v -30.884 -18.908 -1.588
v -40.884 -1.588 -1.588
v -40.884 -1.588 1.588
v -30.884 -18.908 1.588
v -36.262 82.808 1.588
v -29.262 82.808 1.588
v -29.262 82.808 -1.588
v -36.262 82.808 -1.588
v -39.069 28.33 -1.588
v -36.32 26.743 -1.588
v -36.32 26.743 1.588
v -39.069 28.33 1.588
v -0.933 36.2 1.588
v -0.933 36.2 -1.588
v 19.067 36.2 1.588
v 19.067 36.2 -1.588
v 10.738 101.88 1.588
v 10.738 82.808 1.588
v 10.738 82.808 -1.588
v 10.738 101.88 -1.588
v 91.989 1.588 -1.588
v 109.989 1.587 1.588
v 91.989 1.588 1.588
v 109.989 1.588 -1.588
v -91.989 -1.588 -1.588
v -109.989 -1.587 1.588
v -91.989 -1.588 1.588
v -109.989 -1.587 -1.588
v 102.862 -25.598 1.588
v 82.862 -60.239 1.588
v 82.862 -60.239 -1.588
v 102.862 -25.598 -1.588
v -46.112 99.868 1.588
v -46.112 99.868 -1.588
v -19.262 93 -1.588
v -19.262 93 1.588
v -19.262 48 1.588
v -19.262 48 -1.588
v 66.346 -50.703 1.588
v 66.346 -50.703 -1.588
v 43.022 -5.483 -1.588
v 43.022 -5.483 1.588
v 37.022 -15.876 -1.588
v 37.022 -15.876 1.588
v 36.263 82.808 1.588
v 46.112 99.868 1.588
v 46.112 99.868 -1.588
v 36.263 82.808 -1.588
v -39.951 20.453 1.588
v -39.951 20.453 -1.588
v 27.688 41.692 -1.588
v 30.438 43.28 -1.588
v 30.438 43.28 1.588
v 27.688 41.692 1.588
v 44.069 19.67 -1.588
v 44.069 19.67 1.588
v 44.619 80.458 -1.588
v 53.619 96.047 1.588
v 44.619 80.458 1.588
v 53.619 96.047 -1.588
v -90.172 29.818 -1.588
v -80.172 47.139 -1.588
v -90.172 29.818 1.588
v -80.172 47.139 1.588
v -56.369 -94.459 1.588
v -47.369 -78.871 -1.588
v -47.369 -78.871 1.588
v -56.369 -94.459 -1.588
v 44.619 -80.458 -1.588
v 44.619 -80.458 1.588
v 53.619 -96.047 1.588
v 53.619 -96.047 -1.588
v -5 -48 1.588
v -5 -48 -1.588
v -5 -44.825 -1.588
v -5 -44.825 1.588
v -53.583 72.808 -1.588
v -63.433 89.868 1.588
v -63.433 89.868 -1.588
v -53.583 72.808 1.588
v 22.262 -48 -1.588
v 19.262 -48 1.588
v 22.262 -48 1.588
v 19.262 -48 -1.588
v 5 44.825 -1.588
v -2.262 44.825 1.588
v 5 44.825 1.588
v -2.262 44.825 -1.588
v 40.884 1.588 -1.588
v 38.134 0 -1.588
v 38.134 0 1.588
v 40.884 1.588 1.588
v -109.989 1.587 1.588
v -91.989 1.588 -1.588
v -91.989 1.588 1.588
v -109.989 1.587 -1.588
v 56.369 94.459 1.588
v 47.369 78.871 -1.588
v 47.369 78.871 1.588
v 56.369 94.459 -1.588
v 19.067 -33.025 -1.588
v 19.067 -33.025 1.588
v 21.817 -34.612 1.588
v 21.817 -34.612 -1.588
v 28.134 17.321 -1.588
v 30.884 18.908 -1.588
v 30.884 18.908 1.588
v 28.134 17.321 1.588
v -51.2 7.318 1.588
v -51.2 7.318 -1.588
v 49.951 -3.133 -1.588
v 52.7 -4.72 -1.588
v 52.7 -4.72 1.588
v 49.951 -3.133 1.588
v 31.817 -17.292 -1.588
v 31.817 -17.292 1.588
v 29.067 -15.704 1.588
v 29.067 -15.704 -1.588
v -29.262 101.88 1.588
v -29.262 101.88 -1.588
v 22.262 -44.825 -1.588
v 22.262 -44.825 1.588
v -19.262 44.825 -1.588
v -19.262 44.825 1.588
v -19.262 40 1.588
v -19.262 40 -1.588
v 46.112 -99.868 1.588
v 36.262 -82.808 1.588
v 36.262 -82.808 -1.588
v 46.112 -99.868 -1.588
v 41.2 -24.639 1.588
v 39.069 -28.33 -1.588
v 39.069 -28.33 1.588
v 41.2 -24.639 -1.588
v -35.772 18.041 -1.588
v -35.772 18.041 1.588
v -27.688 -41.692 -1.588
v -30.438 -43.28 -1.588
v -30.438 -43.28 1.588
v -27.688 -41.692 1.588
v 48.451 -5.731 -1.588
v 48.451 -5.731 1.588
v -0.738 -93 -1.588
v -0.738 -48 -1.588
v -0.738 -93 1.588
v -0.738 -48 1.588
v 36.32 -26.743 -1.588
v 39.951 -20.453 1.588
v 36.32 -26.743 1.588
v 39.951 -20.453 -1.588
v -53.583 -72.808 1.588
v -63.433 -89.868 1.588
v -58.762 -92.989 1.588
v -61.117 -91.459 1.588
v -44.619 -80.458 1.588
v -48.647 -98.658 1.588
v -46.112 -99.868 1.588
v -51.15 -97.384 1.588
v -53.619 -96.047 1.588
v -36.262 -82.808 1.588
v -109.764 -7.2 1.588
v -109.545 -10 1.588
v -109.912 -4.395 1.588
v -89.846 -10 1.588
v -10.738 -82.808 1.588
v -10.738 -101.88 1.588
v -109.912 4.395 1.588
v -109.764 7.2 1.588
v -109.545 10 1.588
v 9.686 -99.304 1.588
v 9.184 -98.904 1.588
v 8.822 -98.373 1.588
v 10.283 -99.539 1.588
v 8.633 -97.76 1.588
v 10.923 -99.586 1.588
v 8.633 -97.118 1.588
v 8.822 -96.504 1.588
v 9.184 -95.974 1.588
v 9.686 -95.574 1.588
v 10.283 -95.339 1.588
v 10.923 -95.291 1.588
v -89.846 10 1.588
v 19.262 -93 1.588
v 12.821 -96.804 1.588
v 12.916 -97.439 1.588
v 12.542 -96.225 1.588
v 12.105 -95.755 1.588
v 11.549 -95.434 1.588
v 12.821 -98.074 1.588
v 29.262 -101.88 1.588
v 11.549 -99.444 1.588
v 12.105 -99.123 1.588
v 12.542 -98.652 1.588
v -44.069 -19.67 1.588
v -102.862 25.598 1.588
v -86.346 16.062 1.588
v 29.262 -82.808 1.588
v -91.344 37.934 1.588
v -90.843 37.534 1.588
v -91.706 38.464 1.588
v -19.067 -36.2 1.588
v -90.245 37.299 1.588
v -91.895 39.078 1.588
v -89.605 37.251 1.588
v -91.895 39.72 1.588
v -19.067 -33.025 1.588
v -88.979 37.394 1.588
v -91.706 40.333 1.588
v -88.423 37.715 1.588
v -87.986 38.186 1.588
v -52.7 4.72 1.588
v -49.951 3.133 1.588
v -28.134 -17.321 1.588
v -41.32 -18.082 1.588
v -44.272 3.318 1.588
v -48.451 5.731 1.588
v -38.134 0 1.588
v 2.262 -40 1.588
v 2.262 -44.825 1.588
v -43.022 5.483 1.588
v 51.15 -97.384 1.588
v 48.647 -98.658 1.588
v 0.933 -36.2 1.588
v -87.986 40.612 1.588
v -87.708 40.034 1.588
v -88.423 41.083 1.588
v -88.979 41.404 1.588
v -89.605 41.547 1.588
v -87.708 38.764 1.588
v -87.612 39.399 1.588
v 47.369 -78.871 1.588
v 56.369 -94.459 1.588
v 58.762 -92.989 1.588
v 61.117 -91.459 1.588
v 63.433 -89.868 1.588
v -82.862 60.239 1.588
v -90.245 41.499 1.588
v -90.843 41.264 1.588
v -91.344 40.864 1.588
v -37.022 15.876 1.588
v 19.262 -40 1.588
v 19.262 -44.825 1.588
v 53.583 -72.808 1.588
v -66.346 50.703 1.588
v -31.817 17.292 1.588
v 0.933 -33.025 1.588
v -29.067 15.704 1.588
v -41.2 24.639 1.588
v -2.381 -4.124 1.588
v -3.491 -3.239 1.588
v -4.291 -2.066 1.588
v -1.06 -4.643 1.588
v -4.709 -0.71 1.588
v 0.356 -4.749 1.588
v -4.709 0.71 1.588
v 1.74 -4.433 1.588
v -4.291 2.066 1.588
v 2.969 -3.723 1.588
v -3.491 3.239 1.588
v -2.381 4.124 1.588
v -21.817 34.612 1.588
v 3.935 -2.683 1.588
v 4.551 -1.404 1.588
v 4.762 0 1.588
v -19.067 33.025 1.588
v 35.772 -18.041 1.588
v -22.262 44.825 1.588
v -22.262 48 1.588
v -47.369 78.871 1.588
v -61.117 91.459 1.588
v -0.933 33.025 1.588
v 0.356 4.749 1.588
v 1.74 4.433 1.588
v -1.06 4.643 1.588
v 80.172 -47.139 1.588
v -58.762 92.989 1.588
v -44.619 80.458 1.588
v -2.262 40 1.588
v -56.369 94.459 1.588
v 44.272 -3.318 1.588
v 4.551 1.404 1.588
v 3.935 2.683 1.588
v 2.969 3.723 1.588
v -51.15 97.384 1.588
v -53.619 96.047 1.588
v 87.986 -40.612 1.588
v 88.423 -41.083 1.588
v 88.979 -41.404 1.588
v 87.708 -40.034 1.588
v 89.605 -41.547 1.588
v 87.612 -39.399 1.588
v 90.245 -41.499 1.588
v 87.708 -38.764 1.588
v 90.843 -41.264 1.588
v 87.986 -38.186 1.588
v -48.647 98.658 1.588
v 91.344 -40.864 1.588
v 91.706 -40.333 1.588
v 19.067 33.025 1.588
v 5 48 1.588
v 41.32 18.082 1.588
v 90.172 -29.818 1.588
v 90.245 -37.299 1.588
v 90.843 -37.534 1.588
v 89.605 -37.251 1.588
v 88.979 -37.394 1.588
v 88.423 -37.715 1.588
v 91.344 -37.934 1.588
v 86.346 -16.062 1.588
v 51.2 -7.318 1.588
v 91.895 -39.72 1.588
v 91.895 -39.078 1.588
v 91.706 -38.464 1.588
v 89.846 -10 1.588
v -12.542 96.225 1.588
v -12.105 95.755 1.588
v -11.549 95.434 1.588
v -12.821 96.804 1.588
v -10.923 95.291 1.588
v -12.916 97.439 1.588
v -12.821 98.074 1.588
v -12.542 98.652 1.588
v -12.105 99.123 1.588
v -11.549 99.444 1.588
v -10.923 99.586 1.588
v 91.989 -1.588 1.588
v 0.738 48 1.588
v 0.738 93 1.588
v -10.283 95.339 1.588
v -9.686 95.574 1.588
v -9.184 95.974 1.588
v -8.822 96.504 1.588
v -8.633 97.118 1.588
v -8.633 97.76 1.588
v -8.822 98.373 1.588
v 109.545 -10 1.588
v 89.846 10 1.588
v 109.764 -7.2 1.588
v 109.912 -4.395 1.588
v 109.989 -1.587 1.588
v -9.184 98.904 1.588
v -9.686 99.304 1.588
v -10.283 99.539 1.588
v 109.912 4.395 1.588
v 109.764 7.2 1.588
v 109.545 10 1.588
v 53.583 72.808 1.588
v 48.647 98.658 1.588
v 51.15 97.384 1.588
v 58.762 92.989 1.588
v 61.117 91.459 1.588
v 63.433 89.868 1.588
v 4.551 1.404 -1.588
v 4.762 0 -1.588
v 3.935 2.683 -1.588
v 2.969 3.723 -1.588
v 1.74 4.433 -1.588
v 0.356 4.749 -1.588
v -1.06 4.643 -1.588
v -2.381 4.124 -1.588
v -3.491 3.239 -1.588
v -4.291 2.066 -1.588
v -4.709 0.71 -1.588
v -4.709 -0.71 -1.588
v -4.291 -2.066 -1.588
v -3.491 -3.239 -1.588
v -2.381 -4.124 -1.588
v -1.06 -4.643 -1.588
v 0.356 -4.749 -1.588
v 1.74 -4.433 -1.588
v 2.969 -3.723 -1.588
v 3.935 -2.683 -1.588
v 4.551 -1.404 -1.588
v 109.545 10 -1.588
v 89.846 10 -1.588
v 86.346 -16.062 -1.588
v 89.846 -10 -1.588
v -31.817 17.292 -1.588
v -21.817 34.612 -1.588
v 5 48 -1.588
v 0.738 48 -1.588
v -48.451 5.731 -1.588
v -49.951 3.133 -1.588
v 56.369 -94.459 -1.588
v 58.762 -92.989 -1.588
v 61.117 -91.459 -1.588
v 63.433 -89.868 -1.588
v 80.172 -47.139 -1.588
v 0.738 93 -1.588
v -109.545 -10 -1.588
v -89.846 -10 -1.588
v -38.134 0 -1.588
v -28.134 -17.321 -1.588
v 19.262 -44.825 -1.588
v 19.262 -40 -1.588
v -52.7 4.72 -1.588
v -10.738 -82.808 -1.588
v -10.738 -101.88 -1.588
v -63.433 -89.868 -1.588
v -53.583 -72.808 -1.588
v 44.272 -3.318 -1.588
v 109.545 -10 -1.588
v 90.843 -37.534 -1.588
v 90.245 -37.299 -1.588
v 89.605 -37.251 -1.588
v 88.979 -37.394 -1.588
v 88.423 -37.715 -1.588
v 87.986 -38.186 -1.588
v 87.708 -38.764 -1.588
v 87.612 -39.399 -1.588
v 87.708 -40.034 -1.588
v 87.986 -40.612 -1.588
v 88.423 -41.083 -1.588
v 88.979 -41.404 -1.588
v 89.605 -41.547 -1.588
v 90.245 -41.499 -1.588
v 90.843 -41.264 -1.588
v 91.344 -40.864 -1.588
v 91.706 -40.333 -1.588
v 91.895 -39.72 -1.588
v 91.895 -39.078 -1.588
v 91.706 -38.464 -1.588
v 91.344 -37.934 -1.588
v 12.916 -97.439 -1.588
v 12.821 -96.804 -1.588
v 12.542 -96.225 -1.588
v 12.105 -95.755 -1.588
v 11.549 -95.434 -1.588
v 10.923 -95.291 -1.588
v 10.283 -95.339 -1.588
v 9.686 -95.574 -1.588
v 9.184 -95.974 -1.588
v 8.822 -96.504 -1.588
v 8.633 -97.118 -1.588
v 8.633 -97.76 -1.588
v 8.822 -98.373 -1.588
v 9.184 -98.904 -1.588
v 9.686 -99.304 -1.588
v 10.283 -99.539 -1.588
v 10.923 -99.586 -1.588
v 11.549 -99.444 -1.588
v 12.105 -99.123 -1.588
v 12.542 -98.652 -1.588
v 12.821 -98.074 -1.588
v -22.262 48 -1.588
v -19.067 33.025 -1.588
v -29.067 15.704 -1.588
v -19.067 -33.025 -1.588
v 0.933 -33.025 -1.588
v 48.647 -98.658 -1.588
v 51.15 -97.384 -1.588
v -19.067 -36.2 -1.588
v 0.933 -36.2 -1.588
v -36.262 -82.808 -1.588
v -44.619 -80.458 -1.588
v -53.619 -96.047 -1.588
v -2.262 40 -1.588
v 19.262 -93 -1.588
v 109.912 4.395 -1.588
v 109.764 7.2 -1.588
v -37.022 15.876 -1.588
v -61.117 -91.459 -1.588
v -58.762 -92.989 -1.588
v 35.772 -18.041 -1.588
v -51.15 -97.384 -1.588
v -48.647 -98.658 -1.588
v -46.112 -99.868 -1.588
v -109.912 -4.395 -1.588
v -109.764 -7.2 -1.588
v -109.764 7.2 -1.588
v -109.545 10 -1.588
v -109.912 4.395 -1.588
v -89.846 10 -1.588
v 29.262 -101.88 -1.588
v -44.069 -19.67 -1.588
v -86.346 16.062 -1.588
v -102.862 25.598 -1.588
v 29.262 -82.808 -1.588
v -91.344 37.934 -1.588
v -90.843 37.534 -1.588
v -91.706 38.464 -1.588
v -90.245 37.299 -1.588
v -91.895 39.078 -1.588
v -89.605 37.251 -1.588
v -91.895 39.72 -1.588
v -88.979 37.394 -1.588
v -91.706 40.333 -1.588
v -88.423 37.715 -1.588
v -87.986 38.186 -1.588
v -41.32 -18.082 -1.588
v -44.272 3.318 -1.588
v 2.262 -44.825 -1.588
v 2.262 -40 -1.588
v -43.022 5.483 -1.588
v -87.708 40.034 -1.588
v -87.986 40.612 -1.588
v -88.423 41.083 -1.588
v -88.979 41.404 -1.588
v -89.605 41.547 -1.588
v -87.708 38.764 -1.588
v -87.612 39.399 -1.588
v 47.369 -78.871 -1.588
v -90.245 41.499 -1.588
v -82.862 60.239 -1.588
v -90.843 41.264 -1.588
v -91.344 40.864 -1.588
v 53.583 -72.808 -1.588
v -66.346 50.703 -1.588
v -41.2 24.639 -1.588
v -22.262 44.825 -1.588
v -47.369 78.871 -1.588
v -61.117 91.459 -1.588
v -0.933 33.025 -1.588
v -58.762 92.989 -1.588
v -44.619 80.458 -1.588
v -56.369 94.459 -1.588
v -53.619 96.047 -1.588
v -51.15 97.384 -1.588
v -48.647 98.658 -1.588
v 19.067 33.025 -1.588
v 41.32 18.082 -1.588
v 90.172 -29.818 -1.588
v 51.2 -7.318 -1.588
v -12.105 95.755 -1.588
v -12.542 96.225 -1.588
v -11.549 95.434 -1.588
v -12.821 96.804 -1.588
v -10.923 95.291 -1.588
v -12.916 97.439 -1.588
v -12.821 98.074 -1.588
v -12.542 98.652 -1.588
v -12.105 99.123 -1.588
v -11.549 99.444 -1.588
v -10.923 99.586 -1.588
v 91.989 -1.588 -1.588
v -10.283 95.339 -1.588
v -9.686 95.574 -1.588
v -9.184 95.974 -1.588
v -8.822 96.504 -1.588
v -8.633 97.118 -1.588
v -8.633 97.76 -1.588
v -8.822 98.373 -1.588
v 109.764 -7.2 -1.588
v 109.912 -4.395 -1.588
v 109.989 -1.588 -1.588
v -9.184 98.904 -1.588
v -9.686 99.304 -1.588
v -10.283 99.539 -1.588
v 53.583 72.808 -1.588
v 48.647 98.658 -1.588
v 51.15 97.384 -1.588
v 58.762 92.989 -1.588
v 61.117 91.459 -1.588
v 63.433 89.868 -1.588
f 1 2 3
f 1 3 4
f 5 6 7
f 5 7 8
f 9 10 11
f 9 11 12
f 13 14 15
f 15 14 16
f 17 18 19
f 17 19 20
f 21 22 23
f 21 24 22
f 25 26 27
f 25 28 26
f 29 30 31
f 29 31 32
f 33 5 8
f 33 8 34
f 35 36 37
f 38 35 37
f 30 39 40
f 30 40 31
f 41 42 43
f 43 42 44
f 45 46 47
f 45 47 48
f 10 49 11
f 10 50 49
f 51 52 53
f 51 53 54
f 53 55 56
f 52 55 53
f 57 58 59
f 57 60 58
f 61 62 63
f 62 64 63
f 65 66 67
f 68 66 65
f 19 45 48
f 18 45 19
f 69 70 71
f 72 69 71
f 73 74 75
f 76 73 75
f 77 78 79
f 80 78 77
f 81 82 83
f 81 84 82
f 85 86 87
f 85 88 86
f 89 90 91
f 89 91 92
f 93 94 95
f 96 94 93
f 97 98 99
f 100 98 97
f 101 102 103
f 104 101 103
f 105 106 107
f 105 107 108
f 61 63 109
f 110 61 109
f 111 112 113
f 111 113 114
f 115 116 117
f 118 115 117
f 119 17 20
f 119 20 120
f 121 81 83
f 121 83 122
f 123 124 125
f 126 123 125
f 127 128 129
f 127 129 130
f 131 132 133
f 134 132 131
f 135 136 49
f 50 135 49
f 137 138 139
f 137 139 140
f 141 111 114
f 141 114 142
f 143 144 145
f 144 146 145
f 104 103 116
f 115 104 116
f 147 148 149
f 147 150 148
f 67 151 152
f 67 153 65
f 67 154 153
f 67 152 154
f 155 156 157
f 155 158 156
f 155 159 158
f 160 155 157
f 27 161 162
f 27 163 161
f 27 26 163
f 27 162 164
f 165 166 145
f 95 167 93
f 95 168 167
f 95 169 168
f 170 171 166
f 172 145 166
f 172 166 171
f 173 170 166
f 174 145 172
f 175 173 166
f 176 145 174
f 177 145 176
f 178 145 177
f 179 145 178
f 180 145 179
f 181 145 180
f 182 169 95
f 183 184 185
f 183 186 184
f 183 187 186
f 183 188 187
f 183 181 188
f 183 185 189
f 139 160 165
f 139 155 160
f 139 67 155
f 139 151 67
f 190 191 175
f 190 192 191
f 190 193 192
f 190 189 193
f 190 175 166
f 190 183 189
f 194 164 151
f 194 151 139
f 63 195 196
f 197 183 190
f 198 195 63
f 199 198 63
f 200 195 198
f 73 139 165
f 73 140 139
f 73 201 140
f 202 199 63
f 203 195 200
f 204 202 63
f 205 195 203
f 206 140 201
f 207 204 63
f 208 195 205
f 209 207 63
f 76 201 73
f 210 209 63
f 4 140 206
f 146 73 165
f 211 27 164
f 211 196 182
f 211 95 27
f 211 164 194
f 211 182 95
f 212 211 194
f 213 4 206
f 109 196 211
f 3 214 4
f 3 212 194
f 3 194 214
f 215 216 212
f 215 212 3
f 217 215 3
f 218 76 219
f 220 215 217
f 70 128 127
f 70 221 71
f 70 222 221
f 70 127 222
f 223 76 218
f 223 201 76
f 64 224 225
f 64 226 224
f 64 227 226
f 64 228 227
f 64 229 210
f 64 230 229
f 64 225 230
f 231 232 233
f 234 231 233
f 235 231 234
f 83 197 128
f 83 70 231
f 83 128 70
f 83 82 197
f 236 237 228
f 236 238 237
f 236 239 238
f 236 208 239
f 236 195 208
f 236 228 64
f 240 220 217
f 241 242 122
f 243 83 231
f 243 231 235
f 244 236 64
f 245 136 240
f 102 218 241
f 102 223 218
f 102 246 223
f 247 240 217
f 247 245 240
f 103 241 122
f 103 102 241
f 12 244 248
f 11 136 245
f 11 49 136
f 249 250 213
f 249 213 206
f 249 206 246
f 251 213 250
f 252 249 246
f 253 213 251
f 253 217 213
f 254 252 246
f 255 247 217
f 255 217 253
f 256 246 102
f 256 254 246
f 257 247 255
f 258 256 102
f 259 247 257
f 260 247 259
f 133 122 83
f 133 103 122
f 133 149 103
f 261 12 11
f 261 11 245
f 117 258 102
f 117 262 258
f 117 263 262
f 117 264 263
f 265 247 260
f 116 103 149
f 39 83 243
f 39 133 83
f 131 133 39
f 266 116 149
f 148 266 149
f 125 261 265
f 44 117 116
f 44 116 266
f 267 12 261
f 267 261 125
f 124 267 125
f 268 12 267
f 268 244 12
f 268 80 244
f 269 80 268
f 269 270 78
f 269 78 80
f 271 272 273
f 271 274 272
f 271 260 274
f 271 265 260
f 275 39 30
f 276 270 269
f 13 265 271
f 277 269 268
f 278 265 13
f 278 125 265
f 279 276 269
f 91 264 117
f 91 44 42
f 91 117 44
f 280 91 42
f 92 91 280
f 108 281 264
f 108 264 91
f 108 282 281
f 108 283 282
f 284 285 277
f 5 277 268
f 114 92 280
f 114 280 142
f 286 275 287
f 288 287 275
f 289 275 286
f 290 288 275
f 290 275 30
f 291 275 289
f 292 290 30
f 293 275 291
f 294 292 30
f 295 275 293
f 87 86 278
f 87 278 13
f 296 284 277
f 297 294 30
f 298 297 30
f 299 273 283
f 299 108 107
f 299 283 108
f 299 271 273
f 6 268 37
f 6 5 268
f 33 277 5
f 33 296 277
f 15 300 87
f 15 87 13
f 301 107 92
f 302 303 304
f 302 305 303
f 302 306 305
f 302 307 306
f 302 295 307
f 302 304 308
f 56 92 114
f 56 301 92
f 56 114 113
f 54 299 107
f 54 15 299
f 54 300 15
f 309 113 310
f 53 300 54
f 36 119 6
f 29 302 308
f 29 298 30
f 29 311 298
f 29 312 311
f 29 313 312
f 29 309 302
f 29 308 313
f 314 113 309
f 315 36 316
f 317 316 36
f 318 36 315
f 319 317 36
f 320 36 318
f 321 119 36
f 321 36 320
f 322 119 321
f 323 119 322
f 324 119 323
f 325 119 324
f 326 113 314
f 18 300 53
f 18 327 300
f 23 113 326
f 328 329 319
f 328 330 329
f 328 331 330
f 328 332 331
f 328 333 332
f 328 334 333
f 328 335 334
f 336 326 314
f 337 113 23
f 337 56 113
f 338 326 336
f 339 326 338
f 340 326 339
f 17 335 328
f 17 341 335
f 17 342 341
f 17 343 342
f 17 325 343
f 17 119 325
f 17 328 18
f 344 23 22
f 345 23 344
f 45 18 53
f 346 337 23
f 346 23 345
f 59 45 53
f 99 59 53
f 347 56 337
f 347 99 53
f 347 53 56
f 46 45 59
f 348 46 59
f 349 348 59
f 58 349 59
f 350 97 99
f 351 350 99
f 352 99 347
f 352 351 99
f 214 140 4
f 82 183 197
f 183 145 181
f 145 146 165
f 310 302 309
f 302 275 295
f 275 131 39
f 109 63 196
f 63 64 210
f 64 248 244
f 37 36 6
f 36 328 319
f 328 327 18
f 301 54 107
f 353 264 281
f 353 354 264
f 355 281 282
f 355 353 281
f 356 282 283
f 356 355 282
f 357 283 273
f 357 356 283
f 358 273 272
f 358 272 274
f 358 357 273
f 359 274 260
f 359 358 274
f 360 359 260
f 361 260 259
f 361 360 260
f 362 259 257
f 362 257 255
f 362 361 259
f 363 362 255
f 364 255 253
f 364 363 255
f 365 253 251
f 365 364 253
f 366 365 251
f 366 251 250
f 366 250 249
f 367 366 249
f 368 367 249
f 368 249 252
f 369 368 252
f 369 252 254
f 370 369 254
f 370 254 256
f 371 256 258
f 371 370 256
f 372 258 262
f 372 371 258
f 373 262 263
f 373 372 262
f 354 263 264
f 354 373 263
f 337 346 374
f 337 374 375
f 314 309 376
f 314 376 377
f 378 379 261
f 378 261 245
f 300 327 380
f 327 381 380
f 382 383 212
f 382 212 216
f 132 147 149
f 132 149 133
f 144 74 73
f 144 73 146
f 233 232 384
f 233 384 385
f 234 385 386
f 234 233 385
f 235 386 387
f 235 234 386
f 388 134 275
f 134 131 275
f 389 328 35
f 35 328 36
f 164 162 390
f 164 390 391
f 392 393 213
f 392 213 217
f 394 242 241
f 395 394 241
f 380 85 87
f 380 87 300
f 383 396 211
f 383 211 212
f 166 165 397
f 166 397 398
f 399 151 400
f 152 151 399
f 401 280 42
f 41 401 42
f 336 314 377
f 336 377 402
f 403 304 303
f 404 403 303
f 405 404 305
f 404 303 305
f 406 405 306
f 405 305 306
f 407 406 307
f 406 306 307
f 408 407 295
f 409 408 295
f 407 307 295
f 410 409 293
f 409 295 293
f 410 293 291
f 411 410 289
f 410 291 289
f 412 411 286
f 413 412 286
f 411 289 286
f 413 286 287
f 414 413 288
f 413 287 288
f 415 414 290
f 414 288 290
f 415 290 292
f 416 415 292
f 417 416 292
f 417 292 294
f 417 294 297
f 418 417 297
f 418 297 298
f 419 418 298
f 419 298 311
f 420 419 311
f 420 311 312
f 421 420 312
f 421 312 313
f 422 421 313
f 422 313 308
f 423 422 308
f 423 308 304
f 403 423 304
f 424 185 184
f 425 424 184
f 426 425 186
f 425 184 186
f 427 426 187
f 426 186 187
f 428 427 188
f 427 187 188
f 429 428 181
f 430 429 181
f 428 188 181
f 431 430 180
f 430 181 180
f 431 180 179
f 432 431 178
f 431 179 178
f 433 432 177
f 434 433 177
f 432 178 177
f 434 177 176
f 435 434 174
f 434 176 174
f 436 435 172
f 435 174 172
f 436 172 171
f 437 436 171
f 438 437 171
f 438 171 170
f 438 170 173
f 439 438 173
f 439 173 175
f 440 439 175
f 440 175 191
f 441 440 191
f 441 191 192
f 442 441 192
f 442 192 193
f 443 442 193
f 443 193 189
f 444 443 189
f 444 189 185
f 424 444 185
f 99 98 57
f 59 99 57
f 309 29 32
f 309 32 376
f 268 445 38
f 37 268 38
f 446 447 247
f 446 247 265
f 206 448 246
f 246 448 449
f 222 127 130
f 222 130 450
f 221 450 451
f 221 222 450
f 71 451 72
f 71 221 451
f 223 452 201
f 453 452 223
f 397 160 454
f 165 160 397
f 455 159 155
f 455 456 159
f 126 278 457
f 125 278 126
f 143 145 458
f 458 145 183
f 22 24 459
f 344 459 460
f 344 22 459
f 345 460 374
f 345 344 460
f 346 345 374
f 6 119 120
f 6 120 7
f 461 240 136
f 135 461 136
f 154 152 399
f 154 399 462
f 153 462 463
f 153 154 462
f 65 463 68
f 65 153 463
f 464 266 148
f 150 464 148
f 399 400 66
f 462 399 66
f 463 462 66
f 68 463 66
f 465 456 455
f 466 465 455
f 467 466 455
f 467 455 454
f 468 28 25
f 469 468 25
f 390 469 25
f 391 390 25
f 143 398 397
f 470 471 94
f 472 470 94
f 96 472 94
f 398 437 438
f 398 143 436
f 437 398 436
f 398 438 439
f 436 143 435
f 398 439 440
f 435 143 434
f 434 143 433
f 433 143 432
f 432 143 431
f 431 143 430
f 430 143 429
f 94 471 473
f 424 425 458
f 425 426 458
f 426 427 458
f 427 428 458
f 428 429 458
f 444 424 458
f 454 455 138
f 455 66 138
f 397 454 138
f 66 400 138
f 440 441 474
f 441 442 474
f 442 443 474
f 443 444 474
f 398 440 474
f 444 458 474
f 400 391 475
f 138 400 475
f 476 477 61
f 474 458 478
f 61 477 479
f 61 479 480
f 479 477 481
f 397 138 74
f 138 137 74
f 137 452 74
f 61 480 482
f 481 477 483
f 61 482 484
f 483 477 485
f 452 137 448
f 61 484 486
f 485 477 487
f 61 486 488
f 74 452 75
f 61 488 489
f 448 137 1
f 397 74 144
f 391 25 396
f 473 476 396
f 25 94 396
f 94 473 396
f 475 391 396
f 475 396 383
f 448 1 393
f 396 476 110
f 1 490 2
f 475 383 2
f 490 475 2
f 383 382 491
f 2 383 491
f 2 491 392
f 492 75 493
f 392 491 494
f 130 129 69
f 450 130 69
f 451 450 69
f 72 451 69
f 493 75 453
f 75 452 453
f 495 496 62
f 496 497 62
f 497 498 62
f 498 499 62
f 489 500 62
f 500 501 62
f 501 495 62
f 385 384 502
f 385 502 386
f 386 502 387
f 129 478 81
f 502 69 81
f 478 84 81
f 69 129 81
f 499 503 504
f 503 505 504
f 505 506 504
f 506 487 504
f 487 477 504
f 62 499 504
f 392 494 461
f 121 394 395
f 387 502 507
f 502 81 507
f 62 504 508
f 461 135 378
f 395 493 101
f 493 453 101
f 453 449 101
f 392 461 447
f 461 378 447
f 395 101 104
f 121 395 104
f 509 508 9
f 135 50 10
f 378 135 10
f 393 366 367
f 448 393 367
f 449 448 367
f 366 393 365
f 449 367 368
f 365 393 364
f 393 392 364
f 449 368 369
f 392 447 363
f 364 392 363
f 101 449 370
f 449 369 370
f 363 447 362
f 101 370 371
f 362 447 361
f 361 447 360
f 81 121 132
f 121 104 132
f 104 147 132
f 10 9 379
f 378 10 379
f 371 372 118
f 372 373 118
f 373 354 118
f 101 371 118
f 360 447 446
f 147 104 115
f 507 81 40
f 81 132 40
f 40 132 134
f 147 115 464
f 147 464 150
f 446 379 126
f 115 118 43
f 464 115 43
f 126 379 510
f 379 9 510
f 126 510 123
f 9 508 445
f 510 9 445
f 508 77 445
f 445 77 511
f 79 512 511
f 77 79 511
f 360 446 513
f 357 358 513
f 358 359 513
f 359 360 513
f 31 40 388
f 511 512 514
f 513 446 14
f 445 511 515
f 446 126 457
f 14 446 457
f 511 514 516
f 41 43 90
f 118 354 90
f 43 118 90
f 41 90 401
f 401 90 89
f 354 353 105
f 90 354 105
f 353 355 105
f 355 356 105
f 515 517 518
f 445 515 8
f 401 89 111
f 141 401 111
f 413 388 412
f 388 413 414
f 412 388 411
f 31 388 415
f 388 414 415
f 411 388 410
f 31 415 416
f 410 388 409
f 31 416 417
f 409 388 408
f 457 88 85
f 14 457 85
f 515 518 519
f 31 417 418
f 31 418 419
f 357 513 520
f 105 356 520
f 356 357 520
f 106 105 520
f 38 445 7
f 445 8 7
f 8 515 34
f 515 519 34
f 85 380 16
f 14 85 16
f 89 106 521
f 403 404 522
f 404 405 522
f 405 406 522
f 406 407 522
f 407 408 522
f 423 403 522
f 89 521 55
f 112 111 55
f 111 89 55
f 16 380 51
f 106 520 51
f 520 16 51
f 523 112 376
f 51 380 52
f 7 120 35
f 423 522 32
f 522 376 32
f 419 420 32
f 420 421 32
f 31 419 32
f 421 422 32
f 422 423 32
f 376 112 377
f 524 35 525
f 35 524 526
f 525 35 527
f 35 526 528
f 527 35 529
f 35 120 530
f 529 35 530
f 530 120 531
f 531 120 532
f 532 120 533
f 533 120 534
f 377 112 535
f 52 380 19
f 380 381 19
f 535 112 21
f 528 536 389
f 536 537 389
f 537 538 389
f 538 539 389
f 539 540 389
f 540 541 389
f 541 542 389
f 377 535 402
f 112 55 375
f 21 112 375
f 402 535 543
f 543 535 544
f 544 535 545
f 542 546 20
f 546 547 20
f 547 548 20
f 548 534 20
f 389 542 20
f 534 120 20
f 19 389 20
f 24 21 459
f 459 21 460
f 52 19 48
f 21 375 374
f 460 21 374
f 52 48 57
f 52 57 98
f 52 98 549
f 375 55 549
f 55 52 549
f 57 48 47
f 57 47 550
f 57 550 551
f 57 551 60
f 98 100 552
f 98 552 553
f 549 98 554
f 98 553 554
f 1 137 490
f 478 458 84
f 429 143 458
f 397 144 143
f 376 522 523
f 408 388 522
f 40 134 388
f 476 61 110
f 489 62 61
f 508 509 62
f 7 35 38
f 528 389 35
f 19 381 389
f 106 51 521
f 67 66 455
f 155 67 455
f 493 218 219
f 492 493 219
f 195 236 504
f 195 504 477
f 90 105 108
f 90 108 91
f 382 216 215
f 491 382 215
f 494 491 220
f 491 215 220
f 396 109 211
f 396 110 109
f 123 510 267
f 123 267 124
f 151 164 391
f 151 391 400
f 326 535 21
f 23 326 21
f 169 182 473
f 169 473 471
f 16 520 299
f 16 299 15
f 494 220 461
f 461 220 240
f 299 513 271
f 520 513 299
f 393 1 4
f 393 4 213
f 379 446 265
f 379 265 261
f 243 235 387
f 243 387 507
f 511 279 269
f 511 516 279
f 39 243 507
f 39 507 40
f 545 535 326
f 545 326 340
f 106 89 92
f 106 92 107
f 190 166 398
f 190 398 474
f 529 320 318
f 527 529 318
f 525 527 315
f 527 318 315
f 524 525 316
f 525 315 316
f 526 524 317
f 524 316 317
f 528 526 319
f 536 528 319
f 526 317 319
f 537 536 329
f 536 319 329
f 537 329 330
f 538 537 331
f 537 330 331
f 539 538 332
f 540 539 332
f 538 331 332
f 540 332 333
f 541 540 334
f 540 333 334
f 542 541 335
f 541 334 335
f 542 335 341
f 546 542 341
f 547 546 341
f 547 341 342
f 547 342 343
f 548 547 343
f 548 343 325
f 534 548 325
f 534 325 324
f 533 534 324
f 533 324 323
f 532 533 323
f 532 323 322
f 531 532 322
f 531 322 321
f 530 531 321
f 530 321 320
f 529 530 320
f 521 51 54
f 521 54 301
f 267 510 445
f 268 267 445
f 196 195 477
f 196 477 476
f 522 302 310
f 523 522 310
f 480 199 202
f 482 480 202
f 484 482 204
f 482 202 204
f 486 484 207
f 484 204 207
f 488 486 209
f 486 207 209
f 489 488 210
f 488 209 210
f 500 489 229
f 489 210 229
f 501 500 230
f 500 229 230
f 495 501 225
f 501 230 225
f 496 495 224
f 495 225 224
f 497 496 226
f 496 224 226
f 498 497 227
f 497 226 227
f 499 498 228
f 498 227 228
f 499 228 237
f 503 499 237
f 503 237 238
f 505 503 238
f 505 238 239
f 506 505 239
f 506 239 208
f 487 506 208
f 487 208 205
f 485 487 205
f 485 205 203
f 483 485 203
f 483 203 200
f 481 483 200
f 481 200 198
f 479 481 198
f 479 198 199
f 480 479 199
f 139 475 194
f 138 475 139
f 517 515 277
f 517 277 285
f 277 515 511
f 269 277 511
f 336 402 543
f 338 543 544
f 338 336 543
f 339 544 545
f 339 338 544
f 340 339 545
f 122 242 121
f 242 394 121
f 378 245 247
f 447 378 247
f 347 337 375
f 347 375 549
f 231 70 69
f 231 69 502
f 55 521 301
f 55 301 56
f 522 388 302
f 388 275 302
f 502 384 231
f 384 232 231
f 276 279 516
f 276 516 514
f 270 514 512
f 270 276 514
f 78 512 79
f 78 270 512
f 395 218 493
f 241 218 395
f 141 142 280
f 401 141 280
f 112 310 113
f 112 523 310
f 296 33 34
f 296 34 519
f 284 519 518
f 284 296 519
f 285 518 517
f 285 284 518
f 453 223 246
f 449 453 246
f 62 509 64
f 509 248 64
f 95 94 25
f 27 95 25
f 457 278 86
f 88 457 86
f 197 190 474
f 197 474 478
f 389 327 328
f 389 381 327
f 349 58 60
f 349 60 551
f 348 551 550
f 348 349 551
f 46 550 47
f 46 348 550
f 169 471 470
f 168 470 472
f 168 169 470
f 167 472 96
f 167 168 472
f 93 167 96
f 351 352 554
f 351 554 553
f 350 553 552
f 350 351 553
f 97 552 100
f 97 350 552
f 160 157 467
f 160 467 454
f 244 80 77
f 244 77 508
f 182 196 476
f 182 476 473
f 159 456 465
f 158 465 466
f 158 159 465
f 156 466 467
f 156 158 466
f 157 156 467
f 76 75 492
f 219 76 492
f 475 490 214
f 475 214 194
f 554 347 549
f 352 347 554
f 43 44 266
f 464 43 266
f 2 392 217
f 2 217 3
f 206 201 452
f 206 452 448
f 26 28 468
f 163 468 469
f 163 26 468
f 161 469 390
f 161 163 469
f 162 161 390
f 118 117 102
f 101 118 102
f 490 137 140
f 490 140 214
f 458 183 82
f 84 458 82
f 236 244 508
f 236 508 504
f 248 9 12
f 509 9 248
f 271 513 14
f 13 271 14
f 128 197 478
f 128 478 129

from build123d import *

# Parameters (mm, degrees)
SKETCH1_R                   = 110
SKETCH1_R_2                 = 4.7625
BOSS_EXTRUDE1_DEPTH         = 1.5875
SKETCH2_R                   = 2.15375
CUT_EXTRUDE3_DEPTH          = 4.175
CIRPATTERN1_COUNT           = 2
CIRPATTERN2_COUNT           = 2
CIRPATTERN2_ANGLE           = 60
CIRPATTERN2_COPY_1_SKETCH_R = 2.15375
CIRPATTERN2_COPY_1_DEPTH    = 4.175
CUT_EXTRUDE5_DEPTH          = 4.175
CUT_EXTRUDE8_DEPTH          = 5
SKETCH11_W                  = 27.2625
SKETCH11_H                  = 3.175
SKETCH11_W_2                = 20
CUT_EXTRUDE24_DEPTH         = 5


with BuildPart() as part:
    # Sketch1 → Boss-Extrude1 (new body, symmetric)
    with BuildSketch(Plane.XY):
        Circle(SKETCH1_R)
        Circle(SKETCH1_R_2, mode=Mode.SUBTRACT)
        Polygon((-4.7625, 40), (-2.2625, 40), (-2.2625, 48), (0.7375, 48), (0.7375, 93), (-19.2625, 93), (-19.2625, 40), (-16.7625, 40), align=None, mode=Mode.SUBTRACT)
        Polygon((4.7625, -40), (2.2625, -40), (2.2625, -48), (-0.7375, -48), (-0.7375, -93), (19.2625, -93), (19.2625, -40), (16.7625, -40), align=None, mode=Mode.SUBTRACT)
        Polygon((37.022266151, -15.875554014), (35.772266151, -18.040617524), (42.700469382, -22.040617524), (41.200469382, -24.638693735), (80.171612552, -47.138693735), (90.171612552, -29.81818566), (44.272266151, -3.31818566), (43.022266151, -5.483249169), align=None, mode=Mode.SUBTRACT)
        Polygon((-37.022266151, 15.875554014), (-35.772266151, 18.040617524), (-42.700469382, 22.040617524), (-41.200469382, 24.638693735), (-80.171612552, 47.138693735), (-90.171612552, 29.81818566), (-44.272266151, 3.31818566), (-43.022266151, 5.483249169), align=None, mode=Mode.SUBTRACT)
    extrude(amount=BOSS_EXTRUDE1_DEPTH, both=True)

    # Sketch2 → Cut-Extrude3 (cut, through all)
    with BuildSketch(Plane.XY.offset(1.5875)):
        with Locations((10.7625, -97.43875)):
            Circle(SKETCH2_R)
        with BuildLine():
            Line((-10.7375, -82.808492409), (-10.7375, -101.88))
            Line((-10.7375, -101.88), (9.2625, -101.88))
            Line((9.2625, -101.88), (29.2625, -101.88))
            Line((29.2625, -101.88), (29.2625, -82.808492409))
            Line((29.2625, -82.808492409), (36.2625, -82.808492409))
            Line((36.2625, -82.808492409), (46.112001713, -99.868329805))
            ThreePointArc((46.112001713, -99.868329805), (0, -110), (-46.112001713, -99.868329805))
            Line((-46.112001713, -99.868329805), (-36.2625, -82.808492409))
            Line((-36.2625, -82.808492409), (-10.7375, -82.808492409))
        make_face()
    cut_extrude3 = extrude(amount=-CUT_EXTRUDE3_DEPTH, mode=Mode.SUBTRACT)

    # CirPattern1: Cut-Extrude3 ×2 about axis
    cirpattern1_axis = Axis((0, 0, 0), (0, 0, 1))
    for i in range(1, CIRPATTERN1_COUNT):
        add(cut_extrude3.rotate(cirpattern1_axis, i * 360 / CIRPATTERN1_COUNT), mode=Mode.SUBTRACT)

    # CirPattern2: Cut-Extrude3 ×2 about axis
    cirpattern2_axis = Axis((0, 0, 0), (0, 0, 1))
    for i in range(1, CIRPATTERN2_COUNT):
        add(cut_extrude3.rotate(cirpattern2_axis, i * CIRPATTERN2_ANGLE / (CIRPATTERN2_COUNT - 1)), mode=Mode.SUBTRACT)

    # CirPattern2 copy 1 sketch → CirPattern2 copy 1 (cut, through all)
    with BuildSketch(Plane(origin=(0, 0, 1.5875), x_dir=(-0.5, -0.866025404, 0), z_dir=(0, 0, 1))):
        with Locations((10.7625, -97.43875)):
            Circle(CIRPATTERN2_COPY_1_SKETCH_R)
        with BuildLine():
            Line((-10.7375, -82.808492409), (-10.7375, -101.88))
            Line((-10.7375, -101.88), (9.2625, -101.88))
            Line((9.2625, -101.88), (29.2625, -101.88))
            Line((29.2625, -101.88), (29.2625, -82.808492409))
            Line((29.2625, -82.808492409), (36.2625, -82.808492409))
            Line((36.2625, -82.808492409), (46.112001713, -99.868329805))
            ThreePointArc((46.112001713, -99.868329805), (0, -110), (-46.112001713, -99.868329805))
            Line((-46.112001713, -99.868329805), (-36.2625, -82.808492409))
            Line((-36.2625, -82.808492409), (-10.7375, -82.808492409))
        make_face()
    extrude(amount=-CIRPATTERN2_COPY_1_DEPTH, mode=Mode.SUBTRACT)

    # Sketch5 → Cut-Extrude5 (cut, through all)
    with BuildSketch(Plane.XY.offset(1.5875)):
        with BuildLine():
            Line((89.845508076, 10), (53.583008076, 72.808492409))
            Line((53.583008076, 72.808492409), (63.432509788, 89.868329805))
            ThreePointArc((63.432509788, 89.868329805), (95.262794416, 55), (109.544511501, 10))
            Line((109.544511501, 10), (89.845508076, 10))
        make_face()
        with BuildLine():
            Line((-89.845508076, -10), (-53.583008076, -72.808492409))
            Line((-53.583008076, -72.808492409), (-63.432509788, -89.868329805))
            ThreePointArc((-63.432509788, -89.868329805), (-95.262794416, -55), (-109.544511501, -10))
            Line((-109.544511501, -10), (-89.845508076, -10))
        make_face()
    extrude(amount=-CUT_EXTRUDE5_DEPTH, mode=Mode.SUBTRACT)

    # Sketch10 → Cut-Extrude8 (cut, symmetric)
    with BuildSketch(Plane.XY.offset(1.5875)):
        Polygon((-65.369087402, -110.047580625), (-56.369087402, -94.459123357), (-47.369087402, -78.870666089), (-44.619456745, -80.458166089), (-53.619456745, -96.046623357), (-62.619456745, -111.635080625), align=None)
        Polygon((-127.988544148, 1.5875), (-109.988544148, 1.5875), (-91.988544148, 1.5875), (-91.988544148, -1.5875), (-109.988544148, -1.5875), (-127.988544148, -1.5875), align=None)
        Polygon((-62.619456745, 111.635080625), (-53.619456745, 96.046623357), (-44.619456745, 80.458166089), (-47.369087402, 78.870666089), (-56.369087402, 94.459123357), (-65.369087402, 110.047580625), align=None)
        Polygon((65.369087402, 110.047580625), (56.369087402, 94.459123357), (47.369087402, 78.870666089), (44.619456745, 80.458166089), (53.619456745, 96.046623357), (62.619456745, 111.635080625), align=None)
        Polygon((127.988544148, -1.5875), (109.988544148, -1.5875), (91.988544148, -1.5875), (91.988544148, 1.5875), (109.988544148, 1.5875), (127.988544148, 1.5875), align=None)
        Polygon((62.619456745, -111.635080625), (53.619456745, -96.046623357), (44.619456745, -80.458166089), (47.369087402, -78.870666089), (56.369087402, -94.459123357), (65.369087402, -110.047580625), align=None)
    extrude(amount=CUT_EXTRUDE8_DEPTH, both=True, mode=Mode.SUBTRACT)

    # Sketch11 → Cut-Extrude24 (cut, symmetric)
    with BuildSketch(Plane.XY.offset(1.5875)):
        with Locations((8.63125, -46.4125)):
            Rectangle(SKETCH11_W, SKETCH11_H)
        Polygon((-44.069219382, -19.669872981), (-30.437969382, -43.279890552), (-27.688338725, -41.692390552), (-41.319588725, -18.082372981), align=None)
        with Locations((-9.06699264, -34.6125)):
            Rectangle(SKETCH11_W_2, SKETCH11_H)
        Polygon((-38.13398528, 0), (-40.883615937, -1.5875), (-30.883615937, -18.908008076), (-28.13398528, -17.320508076), align=None)
        Polygon((-39.069219382, 28.330127019), (-52.700469382, 4.720109448), (-49.950838725, 3.132609448), (-36.319588725, 26.742627019), align=None)
        Polygon((-19.06699264, 33.025), (-21.816623297, 34.6125), (-31.816623297, 17.291991924), (-29.06699264, 15.704491924), align=None)
        with Locations((-8.63125, 46.4125)):
            Rectangle(SKETCH11_W, SKETCH11_H)
        with Locations((9.06699264, 34.6125)):
            Rectangle(SKETCH11_W_2, SKETCH11_H)
        Polygon((44.069219382, 19.669872981), (30.437969382, 43.279890552), (27.688338725, 41.692390552), (41.319588725, 18.082372981), align=None)
        Polygon((38.13398528, 0), (40.883615937, 1.5875), (30.883615937, 18.908008076), (28.13398528, 17.320508076), align=None)
        Polygon((39.069219382, -28.330127019), (52.700469382, -4.720109448), (49.950838725, -3.132609448), (36.319588725, -26.742627019), align=None)
        Polygon((19.06699264, -33.025), (21.816623297, -34.6125), (31.816623297, -17.291991924), (29.06699264, -15.704491924), align=None)
    extrude(amount=CUT_EXTRUDE24_DEPTH, both=True, mode=Mode.SUBTRACT)


solid = part.part
